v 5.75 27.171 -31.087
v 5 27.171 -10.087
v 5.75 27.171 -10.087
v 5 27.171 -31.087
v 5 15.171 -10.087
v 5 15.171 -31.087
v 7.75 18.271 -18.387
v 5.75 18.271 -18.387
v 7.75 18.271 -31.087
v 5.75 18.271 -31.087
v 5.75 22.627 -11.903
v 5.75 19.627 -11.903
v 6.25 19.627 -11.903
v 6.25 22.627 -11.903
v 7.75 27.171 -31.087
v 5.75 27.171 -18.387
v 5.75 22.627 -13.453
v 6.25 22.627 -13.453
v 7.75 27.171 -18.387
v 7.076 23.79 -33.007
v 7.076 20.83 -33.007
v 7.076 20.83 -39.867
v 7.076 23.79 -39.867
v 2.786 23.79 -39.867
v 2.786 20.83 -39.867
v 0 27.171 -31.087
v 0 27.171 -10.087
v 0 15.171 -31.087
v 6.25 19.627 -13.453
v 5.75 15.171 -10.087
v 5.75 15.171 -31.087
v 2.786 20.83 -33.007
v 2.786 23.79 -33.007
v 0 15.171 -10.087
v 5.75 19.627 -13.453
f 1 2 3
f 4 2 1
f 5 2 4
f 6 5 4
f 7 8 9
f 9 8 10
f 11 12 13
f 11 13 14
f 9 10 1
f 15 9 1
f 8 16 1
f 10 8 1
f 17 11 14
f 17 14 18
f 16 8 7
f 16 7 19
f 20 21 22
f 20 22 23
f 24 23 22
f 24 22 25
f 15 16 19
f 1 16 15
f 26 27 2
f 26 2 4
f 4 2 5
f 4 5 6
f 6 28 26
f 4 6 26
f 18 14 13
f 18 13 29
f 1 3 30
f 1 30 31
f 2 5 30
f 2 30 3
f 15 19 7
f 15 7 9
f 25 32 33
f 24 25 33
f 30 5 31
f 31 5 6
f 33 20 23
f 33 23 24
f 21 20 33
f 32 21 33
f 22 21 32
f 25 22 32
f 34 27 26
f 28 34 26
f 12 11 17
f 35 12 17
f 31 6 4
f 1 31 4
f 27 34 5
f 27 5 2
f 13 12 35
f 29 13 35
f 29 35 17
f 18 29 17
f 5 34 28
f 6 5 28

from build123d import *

# Parameters (mm, degrees)
SKETCH1_W        = 21
SKETCH1_H        = 12
BATTERY_DEPTH    = 5
SKETCH2_W        = 4.29
SKETCH2_H        = 2.96
DRIVER_DEPTH     = 6.86
SKETCH6_W        = 21
SKETCH6_H        = 12
PCB_BOARD_DEPTH  = 0.75
SKETCH7_W        = 12.7
SKETCH7_H        = 8.9
KLR_DEVICE_DEPTH = 2
SKETCH8_W        = 1.55
SKETCH8_H        = 3
ANTENNA_DEPTH    = 0.5


with BuildPart() as part:
    # Sketch1 → battery (new body)
    with BuildSketch(Plane(origin=(0, 0, 0), x_dir=(0, 0, -1), z_dir=(1, 0, 0))):
        with Locations((20.587318323, 21.170679999)):
            Rectangle(SKETCH1_W, SKETCH1_H)
    extrude(amount=BATTERY_DEPTH)


with BuildPart() as body_2:
    # Sketch2 → driver (new body)
    with BuildSketch(Plane(origin=(0, 0, -33.007318323), x_dir=(-1, 0, 0), z_dir=(0, 0, -1))):
        with Locations((-4.930759152, 22.310136325)):
            Rectangle(SKETCH2_W, SKETCH2_H)
    extrude(amount=DRIVER_DEPTH)


with BuildPart() as body_3:
    # Sketch6 → pcb board (new body)
    with BuildSketch(Plane(origin=(5, 0, 0), x_dir=(0, 0, -1), z_dir=(1, 0, 0))):
        with Locations((20.587318323, 21.170679999)):
            Rectangle(SKETCH6_W, SKETCH6_H)
    extrude(amount=PCB_BOARD_DEPTH)


with BuildPart() as body_4:
    # Sketch7 → KLR device (new body)
    with BuildSketch(Plane(origin=(5.75, 0, 0), x_dir=(0, 0, -1), z_dir=(1, 0, 0))):
        with Locations((24.737318323, 22.720679999)):
            Rectangle(SKETCH7_W, SKETCH7_H)
    extrude(amount=KLR_DEVICE_DEPTH)


with BuildPart() as body_5:
    # Sketch8 → antenna (new body)
    with BuildSketch(Plane(origin=(5.75, 0, 0), x_dir=(0, 0, -1), z_dir=(1, 0, 0))):
        with Locations((12.677856533, 21.127328905)):
            Rectangle(SKETCH8_W, SKETCH8_H)
    extrude(amount=ANTENNA_DEPTH)


solid = Compound([part.part, body_2.part, body_3.part, body_4.part, body_5.part])
